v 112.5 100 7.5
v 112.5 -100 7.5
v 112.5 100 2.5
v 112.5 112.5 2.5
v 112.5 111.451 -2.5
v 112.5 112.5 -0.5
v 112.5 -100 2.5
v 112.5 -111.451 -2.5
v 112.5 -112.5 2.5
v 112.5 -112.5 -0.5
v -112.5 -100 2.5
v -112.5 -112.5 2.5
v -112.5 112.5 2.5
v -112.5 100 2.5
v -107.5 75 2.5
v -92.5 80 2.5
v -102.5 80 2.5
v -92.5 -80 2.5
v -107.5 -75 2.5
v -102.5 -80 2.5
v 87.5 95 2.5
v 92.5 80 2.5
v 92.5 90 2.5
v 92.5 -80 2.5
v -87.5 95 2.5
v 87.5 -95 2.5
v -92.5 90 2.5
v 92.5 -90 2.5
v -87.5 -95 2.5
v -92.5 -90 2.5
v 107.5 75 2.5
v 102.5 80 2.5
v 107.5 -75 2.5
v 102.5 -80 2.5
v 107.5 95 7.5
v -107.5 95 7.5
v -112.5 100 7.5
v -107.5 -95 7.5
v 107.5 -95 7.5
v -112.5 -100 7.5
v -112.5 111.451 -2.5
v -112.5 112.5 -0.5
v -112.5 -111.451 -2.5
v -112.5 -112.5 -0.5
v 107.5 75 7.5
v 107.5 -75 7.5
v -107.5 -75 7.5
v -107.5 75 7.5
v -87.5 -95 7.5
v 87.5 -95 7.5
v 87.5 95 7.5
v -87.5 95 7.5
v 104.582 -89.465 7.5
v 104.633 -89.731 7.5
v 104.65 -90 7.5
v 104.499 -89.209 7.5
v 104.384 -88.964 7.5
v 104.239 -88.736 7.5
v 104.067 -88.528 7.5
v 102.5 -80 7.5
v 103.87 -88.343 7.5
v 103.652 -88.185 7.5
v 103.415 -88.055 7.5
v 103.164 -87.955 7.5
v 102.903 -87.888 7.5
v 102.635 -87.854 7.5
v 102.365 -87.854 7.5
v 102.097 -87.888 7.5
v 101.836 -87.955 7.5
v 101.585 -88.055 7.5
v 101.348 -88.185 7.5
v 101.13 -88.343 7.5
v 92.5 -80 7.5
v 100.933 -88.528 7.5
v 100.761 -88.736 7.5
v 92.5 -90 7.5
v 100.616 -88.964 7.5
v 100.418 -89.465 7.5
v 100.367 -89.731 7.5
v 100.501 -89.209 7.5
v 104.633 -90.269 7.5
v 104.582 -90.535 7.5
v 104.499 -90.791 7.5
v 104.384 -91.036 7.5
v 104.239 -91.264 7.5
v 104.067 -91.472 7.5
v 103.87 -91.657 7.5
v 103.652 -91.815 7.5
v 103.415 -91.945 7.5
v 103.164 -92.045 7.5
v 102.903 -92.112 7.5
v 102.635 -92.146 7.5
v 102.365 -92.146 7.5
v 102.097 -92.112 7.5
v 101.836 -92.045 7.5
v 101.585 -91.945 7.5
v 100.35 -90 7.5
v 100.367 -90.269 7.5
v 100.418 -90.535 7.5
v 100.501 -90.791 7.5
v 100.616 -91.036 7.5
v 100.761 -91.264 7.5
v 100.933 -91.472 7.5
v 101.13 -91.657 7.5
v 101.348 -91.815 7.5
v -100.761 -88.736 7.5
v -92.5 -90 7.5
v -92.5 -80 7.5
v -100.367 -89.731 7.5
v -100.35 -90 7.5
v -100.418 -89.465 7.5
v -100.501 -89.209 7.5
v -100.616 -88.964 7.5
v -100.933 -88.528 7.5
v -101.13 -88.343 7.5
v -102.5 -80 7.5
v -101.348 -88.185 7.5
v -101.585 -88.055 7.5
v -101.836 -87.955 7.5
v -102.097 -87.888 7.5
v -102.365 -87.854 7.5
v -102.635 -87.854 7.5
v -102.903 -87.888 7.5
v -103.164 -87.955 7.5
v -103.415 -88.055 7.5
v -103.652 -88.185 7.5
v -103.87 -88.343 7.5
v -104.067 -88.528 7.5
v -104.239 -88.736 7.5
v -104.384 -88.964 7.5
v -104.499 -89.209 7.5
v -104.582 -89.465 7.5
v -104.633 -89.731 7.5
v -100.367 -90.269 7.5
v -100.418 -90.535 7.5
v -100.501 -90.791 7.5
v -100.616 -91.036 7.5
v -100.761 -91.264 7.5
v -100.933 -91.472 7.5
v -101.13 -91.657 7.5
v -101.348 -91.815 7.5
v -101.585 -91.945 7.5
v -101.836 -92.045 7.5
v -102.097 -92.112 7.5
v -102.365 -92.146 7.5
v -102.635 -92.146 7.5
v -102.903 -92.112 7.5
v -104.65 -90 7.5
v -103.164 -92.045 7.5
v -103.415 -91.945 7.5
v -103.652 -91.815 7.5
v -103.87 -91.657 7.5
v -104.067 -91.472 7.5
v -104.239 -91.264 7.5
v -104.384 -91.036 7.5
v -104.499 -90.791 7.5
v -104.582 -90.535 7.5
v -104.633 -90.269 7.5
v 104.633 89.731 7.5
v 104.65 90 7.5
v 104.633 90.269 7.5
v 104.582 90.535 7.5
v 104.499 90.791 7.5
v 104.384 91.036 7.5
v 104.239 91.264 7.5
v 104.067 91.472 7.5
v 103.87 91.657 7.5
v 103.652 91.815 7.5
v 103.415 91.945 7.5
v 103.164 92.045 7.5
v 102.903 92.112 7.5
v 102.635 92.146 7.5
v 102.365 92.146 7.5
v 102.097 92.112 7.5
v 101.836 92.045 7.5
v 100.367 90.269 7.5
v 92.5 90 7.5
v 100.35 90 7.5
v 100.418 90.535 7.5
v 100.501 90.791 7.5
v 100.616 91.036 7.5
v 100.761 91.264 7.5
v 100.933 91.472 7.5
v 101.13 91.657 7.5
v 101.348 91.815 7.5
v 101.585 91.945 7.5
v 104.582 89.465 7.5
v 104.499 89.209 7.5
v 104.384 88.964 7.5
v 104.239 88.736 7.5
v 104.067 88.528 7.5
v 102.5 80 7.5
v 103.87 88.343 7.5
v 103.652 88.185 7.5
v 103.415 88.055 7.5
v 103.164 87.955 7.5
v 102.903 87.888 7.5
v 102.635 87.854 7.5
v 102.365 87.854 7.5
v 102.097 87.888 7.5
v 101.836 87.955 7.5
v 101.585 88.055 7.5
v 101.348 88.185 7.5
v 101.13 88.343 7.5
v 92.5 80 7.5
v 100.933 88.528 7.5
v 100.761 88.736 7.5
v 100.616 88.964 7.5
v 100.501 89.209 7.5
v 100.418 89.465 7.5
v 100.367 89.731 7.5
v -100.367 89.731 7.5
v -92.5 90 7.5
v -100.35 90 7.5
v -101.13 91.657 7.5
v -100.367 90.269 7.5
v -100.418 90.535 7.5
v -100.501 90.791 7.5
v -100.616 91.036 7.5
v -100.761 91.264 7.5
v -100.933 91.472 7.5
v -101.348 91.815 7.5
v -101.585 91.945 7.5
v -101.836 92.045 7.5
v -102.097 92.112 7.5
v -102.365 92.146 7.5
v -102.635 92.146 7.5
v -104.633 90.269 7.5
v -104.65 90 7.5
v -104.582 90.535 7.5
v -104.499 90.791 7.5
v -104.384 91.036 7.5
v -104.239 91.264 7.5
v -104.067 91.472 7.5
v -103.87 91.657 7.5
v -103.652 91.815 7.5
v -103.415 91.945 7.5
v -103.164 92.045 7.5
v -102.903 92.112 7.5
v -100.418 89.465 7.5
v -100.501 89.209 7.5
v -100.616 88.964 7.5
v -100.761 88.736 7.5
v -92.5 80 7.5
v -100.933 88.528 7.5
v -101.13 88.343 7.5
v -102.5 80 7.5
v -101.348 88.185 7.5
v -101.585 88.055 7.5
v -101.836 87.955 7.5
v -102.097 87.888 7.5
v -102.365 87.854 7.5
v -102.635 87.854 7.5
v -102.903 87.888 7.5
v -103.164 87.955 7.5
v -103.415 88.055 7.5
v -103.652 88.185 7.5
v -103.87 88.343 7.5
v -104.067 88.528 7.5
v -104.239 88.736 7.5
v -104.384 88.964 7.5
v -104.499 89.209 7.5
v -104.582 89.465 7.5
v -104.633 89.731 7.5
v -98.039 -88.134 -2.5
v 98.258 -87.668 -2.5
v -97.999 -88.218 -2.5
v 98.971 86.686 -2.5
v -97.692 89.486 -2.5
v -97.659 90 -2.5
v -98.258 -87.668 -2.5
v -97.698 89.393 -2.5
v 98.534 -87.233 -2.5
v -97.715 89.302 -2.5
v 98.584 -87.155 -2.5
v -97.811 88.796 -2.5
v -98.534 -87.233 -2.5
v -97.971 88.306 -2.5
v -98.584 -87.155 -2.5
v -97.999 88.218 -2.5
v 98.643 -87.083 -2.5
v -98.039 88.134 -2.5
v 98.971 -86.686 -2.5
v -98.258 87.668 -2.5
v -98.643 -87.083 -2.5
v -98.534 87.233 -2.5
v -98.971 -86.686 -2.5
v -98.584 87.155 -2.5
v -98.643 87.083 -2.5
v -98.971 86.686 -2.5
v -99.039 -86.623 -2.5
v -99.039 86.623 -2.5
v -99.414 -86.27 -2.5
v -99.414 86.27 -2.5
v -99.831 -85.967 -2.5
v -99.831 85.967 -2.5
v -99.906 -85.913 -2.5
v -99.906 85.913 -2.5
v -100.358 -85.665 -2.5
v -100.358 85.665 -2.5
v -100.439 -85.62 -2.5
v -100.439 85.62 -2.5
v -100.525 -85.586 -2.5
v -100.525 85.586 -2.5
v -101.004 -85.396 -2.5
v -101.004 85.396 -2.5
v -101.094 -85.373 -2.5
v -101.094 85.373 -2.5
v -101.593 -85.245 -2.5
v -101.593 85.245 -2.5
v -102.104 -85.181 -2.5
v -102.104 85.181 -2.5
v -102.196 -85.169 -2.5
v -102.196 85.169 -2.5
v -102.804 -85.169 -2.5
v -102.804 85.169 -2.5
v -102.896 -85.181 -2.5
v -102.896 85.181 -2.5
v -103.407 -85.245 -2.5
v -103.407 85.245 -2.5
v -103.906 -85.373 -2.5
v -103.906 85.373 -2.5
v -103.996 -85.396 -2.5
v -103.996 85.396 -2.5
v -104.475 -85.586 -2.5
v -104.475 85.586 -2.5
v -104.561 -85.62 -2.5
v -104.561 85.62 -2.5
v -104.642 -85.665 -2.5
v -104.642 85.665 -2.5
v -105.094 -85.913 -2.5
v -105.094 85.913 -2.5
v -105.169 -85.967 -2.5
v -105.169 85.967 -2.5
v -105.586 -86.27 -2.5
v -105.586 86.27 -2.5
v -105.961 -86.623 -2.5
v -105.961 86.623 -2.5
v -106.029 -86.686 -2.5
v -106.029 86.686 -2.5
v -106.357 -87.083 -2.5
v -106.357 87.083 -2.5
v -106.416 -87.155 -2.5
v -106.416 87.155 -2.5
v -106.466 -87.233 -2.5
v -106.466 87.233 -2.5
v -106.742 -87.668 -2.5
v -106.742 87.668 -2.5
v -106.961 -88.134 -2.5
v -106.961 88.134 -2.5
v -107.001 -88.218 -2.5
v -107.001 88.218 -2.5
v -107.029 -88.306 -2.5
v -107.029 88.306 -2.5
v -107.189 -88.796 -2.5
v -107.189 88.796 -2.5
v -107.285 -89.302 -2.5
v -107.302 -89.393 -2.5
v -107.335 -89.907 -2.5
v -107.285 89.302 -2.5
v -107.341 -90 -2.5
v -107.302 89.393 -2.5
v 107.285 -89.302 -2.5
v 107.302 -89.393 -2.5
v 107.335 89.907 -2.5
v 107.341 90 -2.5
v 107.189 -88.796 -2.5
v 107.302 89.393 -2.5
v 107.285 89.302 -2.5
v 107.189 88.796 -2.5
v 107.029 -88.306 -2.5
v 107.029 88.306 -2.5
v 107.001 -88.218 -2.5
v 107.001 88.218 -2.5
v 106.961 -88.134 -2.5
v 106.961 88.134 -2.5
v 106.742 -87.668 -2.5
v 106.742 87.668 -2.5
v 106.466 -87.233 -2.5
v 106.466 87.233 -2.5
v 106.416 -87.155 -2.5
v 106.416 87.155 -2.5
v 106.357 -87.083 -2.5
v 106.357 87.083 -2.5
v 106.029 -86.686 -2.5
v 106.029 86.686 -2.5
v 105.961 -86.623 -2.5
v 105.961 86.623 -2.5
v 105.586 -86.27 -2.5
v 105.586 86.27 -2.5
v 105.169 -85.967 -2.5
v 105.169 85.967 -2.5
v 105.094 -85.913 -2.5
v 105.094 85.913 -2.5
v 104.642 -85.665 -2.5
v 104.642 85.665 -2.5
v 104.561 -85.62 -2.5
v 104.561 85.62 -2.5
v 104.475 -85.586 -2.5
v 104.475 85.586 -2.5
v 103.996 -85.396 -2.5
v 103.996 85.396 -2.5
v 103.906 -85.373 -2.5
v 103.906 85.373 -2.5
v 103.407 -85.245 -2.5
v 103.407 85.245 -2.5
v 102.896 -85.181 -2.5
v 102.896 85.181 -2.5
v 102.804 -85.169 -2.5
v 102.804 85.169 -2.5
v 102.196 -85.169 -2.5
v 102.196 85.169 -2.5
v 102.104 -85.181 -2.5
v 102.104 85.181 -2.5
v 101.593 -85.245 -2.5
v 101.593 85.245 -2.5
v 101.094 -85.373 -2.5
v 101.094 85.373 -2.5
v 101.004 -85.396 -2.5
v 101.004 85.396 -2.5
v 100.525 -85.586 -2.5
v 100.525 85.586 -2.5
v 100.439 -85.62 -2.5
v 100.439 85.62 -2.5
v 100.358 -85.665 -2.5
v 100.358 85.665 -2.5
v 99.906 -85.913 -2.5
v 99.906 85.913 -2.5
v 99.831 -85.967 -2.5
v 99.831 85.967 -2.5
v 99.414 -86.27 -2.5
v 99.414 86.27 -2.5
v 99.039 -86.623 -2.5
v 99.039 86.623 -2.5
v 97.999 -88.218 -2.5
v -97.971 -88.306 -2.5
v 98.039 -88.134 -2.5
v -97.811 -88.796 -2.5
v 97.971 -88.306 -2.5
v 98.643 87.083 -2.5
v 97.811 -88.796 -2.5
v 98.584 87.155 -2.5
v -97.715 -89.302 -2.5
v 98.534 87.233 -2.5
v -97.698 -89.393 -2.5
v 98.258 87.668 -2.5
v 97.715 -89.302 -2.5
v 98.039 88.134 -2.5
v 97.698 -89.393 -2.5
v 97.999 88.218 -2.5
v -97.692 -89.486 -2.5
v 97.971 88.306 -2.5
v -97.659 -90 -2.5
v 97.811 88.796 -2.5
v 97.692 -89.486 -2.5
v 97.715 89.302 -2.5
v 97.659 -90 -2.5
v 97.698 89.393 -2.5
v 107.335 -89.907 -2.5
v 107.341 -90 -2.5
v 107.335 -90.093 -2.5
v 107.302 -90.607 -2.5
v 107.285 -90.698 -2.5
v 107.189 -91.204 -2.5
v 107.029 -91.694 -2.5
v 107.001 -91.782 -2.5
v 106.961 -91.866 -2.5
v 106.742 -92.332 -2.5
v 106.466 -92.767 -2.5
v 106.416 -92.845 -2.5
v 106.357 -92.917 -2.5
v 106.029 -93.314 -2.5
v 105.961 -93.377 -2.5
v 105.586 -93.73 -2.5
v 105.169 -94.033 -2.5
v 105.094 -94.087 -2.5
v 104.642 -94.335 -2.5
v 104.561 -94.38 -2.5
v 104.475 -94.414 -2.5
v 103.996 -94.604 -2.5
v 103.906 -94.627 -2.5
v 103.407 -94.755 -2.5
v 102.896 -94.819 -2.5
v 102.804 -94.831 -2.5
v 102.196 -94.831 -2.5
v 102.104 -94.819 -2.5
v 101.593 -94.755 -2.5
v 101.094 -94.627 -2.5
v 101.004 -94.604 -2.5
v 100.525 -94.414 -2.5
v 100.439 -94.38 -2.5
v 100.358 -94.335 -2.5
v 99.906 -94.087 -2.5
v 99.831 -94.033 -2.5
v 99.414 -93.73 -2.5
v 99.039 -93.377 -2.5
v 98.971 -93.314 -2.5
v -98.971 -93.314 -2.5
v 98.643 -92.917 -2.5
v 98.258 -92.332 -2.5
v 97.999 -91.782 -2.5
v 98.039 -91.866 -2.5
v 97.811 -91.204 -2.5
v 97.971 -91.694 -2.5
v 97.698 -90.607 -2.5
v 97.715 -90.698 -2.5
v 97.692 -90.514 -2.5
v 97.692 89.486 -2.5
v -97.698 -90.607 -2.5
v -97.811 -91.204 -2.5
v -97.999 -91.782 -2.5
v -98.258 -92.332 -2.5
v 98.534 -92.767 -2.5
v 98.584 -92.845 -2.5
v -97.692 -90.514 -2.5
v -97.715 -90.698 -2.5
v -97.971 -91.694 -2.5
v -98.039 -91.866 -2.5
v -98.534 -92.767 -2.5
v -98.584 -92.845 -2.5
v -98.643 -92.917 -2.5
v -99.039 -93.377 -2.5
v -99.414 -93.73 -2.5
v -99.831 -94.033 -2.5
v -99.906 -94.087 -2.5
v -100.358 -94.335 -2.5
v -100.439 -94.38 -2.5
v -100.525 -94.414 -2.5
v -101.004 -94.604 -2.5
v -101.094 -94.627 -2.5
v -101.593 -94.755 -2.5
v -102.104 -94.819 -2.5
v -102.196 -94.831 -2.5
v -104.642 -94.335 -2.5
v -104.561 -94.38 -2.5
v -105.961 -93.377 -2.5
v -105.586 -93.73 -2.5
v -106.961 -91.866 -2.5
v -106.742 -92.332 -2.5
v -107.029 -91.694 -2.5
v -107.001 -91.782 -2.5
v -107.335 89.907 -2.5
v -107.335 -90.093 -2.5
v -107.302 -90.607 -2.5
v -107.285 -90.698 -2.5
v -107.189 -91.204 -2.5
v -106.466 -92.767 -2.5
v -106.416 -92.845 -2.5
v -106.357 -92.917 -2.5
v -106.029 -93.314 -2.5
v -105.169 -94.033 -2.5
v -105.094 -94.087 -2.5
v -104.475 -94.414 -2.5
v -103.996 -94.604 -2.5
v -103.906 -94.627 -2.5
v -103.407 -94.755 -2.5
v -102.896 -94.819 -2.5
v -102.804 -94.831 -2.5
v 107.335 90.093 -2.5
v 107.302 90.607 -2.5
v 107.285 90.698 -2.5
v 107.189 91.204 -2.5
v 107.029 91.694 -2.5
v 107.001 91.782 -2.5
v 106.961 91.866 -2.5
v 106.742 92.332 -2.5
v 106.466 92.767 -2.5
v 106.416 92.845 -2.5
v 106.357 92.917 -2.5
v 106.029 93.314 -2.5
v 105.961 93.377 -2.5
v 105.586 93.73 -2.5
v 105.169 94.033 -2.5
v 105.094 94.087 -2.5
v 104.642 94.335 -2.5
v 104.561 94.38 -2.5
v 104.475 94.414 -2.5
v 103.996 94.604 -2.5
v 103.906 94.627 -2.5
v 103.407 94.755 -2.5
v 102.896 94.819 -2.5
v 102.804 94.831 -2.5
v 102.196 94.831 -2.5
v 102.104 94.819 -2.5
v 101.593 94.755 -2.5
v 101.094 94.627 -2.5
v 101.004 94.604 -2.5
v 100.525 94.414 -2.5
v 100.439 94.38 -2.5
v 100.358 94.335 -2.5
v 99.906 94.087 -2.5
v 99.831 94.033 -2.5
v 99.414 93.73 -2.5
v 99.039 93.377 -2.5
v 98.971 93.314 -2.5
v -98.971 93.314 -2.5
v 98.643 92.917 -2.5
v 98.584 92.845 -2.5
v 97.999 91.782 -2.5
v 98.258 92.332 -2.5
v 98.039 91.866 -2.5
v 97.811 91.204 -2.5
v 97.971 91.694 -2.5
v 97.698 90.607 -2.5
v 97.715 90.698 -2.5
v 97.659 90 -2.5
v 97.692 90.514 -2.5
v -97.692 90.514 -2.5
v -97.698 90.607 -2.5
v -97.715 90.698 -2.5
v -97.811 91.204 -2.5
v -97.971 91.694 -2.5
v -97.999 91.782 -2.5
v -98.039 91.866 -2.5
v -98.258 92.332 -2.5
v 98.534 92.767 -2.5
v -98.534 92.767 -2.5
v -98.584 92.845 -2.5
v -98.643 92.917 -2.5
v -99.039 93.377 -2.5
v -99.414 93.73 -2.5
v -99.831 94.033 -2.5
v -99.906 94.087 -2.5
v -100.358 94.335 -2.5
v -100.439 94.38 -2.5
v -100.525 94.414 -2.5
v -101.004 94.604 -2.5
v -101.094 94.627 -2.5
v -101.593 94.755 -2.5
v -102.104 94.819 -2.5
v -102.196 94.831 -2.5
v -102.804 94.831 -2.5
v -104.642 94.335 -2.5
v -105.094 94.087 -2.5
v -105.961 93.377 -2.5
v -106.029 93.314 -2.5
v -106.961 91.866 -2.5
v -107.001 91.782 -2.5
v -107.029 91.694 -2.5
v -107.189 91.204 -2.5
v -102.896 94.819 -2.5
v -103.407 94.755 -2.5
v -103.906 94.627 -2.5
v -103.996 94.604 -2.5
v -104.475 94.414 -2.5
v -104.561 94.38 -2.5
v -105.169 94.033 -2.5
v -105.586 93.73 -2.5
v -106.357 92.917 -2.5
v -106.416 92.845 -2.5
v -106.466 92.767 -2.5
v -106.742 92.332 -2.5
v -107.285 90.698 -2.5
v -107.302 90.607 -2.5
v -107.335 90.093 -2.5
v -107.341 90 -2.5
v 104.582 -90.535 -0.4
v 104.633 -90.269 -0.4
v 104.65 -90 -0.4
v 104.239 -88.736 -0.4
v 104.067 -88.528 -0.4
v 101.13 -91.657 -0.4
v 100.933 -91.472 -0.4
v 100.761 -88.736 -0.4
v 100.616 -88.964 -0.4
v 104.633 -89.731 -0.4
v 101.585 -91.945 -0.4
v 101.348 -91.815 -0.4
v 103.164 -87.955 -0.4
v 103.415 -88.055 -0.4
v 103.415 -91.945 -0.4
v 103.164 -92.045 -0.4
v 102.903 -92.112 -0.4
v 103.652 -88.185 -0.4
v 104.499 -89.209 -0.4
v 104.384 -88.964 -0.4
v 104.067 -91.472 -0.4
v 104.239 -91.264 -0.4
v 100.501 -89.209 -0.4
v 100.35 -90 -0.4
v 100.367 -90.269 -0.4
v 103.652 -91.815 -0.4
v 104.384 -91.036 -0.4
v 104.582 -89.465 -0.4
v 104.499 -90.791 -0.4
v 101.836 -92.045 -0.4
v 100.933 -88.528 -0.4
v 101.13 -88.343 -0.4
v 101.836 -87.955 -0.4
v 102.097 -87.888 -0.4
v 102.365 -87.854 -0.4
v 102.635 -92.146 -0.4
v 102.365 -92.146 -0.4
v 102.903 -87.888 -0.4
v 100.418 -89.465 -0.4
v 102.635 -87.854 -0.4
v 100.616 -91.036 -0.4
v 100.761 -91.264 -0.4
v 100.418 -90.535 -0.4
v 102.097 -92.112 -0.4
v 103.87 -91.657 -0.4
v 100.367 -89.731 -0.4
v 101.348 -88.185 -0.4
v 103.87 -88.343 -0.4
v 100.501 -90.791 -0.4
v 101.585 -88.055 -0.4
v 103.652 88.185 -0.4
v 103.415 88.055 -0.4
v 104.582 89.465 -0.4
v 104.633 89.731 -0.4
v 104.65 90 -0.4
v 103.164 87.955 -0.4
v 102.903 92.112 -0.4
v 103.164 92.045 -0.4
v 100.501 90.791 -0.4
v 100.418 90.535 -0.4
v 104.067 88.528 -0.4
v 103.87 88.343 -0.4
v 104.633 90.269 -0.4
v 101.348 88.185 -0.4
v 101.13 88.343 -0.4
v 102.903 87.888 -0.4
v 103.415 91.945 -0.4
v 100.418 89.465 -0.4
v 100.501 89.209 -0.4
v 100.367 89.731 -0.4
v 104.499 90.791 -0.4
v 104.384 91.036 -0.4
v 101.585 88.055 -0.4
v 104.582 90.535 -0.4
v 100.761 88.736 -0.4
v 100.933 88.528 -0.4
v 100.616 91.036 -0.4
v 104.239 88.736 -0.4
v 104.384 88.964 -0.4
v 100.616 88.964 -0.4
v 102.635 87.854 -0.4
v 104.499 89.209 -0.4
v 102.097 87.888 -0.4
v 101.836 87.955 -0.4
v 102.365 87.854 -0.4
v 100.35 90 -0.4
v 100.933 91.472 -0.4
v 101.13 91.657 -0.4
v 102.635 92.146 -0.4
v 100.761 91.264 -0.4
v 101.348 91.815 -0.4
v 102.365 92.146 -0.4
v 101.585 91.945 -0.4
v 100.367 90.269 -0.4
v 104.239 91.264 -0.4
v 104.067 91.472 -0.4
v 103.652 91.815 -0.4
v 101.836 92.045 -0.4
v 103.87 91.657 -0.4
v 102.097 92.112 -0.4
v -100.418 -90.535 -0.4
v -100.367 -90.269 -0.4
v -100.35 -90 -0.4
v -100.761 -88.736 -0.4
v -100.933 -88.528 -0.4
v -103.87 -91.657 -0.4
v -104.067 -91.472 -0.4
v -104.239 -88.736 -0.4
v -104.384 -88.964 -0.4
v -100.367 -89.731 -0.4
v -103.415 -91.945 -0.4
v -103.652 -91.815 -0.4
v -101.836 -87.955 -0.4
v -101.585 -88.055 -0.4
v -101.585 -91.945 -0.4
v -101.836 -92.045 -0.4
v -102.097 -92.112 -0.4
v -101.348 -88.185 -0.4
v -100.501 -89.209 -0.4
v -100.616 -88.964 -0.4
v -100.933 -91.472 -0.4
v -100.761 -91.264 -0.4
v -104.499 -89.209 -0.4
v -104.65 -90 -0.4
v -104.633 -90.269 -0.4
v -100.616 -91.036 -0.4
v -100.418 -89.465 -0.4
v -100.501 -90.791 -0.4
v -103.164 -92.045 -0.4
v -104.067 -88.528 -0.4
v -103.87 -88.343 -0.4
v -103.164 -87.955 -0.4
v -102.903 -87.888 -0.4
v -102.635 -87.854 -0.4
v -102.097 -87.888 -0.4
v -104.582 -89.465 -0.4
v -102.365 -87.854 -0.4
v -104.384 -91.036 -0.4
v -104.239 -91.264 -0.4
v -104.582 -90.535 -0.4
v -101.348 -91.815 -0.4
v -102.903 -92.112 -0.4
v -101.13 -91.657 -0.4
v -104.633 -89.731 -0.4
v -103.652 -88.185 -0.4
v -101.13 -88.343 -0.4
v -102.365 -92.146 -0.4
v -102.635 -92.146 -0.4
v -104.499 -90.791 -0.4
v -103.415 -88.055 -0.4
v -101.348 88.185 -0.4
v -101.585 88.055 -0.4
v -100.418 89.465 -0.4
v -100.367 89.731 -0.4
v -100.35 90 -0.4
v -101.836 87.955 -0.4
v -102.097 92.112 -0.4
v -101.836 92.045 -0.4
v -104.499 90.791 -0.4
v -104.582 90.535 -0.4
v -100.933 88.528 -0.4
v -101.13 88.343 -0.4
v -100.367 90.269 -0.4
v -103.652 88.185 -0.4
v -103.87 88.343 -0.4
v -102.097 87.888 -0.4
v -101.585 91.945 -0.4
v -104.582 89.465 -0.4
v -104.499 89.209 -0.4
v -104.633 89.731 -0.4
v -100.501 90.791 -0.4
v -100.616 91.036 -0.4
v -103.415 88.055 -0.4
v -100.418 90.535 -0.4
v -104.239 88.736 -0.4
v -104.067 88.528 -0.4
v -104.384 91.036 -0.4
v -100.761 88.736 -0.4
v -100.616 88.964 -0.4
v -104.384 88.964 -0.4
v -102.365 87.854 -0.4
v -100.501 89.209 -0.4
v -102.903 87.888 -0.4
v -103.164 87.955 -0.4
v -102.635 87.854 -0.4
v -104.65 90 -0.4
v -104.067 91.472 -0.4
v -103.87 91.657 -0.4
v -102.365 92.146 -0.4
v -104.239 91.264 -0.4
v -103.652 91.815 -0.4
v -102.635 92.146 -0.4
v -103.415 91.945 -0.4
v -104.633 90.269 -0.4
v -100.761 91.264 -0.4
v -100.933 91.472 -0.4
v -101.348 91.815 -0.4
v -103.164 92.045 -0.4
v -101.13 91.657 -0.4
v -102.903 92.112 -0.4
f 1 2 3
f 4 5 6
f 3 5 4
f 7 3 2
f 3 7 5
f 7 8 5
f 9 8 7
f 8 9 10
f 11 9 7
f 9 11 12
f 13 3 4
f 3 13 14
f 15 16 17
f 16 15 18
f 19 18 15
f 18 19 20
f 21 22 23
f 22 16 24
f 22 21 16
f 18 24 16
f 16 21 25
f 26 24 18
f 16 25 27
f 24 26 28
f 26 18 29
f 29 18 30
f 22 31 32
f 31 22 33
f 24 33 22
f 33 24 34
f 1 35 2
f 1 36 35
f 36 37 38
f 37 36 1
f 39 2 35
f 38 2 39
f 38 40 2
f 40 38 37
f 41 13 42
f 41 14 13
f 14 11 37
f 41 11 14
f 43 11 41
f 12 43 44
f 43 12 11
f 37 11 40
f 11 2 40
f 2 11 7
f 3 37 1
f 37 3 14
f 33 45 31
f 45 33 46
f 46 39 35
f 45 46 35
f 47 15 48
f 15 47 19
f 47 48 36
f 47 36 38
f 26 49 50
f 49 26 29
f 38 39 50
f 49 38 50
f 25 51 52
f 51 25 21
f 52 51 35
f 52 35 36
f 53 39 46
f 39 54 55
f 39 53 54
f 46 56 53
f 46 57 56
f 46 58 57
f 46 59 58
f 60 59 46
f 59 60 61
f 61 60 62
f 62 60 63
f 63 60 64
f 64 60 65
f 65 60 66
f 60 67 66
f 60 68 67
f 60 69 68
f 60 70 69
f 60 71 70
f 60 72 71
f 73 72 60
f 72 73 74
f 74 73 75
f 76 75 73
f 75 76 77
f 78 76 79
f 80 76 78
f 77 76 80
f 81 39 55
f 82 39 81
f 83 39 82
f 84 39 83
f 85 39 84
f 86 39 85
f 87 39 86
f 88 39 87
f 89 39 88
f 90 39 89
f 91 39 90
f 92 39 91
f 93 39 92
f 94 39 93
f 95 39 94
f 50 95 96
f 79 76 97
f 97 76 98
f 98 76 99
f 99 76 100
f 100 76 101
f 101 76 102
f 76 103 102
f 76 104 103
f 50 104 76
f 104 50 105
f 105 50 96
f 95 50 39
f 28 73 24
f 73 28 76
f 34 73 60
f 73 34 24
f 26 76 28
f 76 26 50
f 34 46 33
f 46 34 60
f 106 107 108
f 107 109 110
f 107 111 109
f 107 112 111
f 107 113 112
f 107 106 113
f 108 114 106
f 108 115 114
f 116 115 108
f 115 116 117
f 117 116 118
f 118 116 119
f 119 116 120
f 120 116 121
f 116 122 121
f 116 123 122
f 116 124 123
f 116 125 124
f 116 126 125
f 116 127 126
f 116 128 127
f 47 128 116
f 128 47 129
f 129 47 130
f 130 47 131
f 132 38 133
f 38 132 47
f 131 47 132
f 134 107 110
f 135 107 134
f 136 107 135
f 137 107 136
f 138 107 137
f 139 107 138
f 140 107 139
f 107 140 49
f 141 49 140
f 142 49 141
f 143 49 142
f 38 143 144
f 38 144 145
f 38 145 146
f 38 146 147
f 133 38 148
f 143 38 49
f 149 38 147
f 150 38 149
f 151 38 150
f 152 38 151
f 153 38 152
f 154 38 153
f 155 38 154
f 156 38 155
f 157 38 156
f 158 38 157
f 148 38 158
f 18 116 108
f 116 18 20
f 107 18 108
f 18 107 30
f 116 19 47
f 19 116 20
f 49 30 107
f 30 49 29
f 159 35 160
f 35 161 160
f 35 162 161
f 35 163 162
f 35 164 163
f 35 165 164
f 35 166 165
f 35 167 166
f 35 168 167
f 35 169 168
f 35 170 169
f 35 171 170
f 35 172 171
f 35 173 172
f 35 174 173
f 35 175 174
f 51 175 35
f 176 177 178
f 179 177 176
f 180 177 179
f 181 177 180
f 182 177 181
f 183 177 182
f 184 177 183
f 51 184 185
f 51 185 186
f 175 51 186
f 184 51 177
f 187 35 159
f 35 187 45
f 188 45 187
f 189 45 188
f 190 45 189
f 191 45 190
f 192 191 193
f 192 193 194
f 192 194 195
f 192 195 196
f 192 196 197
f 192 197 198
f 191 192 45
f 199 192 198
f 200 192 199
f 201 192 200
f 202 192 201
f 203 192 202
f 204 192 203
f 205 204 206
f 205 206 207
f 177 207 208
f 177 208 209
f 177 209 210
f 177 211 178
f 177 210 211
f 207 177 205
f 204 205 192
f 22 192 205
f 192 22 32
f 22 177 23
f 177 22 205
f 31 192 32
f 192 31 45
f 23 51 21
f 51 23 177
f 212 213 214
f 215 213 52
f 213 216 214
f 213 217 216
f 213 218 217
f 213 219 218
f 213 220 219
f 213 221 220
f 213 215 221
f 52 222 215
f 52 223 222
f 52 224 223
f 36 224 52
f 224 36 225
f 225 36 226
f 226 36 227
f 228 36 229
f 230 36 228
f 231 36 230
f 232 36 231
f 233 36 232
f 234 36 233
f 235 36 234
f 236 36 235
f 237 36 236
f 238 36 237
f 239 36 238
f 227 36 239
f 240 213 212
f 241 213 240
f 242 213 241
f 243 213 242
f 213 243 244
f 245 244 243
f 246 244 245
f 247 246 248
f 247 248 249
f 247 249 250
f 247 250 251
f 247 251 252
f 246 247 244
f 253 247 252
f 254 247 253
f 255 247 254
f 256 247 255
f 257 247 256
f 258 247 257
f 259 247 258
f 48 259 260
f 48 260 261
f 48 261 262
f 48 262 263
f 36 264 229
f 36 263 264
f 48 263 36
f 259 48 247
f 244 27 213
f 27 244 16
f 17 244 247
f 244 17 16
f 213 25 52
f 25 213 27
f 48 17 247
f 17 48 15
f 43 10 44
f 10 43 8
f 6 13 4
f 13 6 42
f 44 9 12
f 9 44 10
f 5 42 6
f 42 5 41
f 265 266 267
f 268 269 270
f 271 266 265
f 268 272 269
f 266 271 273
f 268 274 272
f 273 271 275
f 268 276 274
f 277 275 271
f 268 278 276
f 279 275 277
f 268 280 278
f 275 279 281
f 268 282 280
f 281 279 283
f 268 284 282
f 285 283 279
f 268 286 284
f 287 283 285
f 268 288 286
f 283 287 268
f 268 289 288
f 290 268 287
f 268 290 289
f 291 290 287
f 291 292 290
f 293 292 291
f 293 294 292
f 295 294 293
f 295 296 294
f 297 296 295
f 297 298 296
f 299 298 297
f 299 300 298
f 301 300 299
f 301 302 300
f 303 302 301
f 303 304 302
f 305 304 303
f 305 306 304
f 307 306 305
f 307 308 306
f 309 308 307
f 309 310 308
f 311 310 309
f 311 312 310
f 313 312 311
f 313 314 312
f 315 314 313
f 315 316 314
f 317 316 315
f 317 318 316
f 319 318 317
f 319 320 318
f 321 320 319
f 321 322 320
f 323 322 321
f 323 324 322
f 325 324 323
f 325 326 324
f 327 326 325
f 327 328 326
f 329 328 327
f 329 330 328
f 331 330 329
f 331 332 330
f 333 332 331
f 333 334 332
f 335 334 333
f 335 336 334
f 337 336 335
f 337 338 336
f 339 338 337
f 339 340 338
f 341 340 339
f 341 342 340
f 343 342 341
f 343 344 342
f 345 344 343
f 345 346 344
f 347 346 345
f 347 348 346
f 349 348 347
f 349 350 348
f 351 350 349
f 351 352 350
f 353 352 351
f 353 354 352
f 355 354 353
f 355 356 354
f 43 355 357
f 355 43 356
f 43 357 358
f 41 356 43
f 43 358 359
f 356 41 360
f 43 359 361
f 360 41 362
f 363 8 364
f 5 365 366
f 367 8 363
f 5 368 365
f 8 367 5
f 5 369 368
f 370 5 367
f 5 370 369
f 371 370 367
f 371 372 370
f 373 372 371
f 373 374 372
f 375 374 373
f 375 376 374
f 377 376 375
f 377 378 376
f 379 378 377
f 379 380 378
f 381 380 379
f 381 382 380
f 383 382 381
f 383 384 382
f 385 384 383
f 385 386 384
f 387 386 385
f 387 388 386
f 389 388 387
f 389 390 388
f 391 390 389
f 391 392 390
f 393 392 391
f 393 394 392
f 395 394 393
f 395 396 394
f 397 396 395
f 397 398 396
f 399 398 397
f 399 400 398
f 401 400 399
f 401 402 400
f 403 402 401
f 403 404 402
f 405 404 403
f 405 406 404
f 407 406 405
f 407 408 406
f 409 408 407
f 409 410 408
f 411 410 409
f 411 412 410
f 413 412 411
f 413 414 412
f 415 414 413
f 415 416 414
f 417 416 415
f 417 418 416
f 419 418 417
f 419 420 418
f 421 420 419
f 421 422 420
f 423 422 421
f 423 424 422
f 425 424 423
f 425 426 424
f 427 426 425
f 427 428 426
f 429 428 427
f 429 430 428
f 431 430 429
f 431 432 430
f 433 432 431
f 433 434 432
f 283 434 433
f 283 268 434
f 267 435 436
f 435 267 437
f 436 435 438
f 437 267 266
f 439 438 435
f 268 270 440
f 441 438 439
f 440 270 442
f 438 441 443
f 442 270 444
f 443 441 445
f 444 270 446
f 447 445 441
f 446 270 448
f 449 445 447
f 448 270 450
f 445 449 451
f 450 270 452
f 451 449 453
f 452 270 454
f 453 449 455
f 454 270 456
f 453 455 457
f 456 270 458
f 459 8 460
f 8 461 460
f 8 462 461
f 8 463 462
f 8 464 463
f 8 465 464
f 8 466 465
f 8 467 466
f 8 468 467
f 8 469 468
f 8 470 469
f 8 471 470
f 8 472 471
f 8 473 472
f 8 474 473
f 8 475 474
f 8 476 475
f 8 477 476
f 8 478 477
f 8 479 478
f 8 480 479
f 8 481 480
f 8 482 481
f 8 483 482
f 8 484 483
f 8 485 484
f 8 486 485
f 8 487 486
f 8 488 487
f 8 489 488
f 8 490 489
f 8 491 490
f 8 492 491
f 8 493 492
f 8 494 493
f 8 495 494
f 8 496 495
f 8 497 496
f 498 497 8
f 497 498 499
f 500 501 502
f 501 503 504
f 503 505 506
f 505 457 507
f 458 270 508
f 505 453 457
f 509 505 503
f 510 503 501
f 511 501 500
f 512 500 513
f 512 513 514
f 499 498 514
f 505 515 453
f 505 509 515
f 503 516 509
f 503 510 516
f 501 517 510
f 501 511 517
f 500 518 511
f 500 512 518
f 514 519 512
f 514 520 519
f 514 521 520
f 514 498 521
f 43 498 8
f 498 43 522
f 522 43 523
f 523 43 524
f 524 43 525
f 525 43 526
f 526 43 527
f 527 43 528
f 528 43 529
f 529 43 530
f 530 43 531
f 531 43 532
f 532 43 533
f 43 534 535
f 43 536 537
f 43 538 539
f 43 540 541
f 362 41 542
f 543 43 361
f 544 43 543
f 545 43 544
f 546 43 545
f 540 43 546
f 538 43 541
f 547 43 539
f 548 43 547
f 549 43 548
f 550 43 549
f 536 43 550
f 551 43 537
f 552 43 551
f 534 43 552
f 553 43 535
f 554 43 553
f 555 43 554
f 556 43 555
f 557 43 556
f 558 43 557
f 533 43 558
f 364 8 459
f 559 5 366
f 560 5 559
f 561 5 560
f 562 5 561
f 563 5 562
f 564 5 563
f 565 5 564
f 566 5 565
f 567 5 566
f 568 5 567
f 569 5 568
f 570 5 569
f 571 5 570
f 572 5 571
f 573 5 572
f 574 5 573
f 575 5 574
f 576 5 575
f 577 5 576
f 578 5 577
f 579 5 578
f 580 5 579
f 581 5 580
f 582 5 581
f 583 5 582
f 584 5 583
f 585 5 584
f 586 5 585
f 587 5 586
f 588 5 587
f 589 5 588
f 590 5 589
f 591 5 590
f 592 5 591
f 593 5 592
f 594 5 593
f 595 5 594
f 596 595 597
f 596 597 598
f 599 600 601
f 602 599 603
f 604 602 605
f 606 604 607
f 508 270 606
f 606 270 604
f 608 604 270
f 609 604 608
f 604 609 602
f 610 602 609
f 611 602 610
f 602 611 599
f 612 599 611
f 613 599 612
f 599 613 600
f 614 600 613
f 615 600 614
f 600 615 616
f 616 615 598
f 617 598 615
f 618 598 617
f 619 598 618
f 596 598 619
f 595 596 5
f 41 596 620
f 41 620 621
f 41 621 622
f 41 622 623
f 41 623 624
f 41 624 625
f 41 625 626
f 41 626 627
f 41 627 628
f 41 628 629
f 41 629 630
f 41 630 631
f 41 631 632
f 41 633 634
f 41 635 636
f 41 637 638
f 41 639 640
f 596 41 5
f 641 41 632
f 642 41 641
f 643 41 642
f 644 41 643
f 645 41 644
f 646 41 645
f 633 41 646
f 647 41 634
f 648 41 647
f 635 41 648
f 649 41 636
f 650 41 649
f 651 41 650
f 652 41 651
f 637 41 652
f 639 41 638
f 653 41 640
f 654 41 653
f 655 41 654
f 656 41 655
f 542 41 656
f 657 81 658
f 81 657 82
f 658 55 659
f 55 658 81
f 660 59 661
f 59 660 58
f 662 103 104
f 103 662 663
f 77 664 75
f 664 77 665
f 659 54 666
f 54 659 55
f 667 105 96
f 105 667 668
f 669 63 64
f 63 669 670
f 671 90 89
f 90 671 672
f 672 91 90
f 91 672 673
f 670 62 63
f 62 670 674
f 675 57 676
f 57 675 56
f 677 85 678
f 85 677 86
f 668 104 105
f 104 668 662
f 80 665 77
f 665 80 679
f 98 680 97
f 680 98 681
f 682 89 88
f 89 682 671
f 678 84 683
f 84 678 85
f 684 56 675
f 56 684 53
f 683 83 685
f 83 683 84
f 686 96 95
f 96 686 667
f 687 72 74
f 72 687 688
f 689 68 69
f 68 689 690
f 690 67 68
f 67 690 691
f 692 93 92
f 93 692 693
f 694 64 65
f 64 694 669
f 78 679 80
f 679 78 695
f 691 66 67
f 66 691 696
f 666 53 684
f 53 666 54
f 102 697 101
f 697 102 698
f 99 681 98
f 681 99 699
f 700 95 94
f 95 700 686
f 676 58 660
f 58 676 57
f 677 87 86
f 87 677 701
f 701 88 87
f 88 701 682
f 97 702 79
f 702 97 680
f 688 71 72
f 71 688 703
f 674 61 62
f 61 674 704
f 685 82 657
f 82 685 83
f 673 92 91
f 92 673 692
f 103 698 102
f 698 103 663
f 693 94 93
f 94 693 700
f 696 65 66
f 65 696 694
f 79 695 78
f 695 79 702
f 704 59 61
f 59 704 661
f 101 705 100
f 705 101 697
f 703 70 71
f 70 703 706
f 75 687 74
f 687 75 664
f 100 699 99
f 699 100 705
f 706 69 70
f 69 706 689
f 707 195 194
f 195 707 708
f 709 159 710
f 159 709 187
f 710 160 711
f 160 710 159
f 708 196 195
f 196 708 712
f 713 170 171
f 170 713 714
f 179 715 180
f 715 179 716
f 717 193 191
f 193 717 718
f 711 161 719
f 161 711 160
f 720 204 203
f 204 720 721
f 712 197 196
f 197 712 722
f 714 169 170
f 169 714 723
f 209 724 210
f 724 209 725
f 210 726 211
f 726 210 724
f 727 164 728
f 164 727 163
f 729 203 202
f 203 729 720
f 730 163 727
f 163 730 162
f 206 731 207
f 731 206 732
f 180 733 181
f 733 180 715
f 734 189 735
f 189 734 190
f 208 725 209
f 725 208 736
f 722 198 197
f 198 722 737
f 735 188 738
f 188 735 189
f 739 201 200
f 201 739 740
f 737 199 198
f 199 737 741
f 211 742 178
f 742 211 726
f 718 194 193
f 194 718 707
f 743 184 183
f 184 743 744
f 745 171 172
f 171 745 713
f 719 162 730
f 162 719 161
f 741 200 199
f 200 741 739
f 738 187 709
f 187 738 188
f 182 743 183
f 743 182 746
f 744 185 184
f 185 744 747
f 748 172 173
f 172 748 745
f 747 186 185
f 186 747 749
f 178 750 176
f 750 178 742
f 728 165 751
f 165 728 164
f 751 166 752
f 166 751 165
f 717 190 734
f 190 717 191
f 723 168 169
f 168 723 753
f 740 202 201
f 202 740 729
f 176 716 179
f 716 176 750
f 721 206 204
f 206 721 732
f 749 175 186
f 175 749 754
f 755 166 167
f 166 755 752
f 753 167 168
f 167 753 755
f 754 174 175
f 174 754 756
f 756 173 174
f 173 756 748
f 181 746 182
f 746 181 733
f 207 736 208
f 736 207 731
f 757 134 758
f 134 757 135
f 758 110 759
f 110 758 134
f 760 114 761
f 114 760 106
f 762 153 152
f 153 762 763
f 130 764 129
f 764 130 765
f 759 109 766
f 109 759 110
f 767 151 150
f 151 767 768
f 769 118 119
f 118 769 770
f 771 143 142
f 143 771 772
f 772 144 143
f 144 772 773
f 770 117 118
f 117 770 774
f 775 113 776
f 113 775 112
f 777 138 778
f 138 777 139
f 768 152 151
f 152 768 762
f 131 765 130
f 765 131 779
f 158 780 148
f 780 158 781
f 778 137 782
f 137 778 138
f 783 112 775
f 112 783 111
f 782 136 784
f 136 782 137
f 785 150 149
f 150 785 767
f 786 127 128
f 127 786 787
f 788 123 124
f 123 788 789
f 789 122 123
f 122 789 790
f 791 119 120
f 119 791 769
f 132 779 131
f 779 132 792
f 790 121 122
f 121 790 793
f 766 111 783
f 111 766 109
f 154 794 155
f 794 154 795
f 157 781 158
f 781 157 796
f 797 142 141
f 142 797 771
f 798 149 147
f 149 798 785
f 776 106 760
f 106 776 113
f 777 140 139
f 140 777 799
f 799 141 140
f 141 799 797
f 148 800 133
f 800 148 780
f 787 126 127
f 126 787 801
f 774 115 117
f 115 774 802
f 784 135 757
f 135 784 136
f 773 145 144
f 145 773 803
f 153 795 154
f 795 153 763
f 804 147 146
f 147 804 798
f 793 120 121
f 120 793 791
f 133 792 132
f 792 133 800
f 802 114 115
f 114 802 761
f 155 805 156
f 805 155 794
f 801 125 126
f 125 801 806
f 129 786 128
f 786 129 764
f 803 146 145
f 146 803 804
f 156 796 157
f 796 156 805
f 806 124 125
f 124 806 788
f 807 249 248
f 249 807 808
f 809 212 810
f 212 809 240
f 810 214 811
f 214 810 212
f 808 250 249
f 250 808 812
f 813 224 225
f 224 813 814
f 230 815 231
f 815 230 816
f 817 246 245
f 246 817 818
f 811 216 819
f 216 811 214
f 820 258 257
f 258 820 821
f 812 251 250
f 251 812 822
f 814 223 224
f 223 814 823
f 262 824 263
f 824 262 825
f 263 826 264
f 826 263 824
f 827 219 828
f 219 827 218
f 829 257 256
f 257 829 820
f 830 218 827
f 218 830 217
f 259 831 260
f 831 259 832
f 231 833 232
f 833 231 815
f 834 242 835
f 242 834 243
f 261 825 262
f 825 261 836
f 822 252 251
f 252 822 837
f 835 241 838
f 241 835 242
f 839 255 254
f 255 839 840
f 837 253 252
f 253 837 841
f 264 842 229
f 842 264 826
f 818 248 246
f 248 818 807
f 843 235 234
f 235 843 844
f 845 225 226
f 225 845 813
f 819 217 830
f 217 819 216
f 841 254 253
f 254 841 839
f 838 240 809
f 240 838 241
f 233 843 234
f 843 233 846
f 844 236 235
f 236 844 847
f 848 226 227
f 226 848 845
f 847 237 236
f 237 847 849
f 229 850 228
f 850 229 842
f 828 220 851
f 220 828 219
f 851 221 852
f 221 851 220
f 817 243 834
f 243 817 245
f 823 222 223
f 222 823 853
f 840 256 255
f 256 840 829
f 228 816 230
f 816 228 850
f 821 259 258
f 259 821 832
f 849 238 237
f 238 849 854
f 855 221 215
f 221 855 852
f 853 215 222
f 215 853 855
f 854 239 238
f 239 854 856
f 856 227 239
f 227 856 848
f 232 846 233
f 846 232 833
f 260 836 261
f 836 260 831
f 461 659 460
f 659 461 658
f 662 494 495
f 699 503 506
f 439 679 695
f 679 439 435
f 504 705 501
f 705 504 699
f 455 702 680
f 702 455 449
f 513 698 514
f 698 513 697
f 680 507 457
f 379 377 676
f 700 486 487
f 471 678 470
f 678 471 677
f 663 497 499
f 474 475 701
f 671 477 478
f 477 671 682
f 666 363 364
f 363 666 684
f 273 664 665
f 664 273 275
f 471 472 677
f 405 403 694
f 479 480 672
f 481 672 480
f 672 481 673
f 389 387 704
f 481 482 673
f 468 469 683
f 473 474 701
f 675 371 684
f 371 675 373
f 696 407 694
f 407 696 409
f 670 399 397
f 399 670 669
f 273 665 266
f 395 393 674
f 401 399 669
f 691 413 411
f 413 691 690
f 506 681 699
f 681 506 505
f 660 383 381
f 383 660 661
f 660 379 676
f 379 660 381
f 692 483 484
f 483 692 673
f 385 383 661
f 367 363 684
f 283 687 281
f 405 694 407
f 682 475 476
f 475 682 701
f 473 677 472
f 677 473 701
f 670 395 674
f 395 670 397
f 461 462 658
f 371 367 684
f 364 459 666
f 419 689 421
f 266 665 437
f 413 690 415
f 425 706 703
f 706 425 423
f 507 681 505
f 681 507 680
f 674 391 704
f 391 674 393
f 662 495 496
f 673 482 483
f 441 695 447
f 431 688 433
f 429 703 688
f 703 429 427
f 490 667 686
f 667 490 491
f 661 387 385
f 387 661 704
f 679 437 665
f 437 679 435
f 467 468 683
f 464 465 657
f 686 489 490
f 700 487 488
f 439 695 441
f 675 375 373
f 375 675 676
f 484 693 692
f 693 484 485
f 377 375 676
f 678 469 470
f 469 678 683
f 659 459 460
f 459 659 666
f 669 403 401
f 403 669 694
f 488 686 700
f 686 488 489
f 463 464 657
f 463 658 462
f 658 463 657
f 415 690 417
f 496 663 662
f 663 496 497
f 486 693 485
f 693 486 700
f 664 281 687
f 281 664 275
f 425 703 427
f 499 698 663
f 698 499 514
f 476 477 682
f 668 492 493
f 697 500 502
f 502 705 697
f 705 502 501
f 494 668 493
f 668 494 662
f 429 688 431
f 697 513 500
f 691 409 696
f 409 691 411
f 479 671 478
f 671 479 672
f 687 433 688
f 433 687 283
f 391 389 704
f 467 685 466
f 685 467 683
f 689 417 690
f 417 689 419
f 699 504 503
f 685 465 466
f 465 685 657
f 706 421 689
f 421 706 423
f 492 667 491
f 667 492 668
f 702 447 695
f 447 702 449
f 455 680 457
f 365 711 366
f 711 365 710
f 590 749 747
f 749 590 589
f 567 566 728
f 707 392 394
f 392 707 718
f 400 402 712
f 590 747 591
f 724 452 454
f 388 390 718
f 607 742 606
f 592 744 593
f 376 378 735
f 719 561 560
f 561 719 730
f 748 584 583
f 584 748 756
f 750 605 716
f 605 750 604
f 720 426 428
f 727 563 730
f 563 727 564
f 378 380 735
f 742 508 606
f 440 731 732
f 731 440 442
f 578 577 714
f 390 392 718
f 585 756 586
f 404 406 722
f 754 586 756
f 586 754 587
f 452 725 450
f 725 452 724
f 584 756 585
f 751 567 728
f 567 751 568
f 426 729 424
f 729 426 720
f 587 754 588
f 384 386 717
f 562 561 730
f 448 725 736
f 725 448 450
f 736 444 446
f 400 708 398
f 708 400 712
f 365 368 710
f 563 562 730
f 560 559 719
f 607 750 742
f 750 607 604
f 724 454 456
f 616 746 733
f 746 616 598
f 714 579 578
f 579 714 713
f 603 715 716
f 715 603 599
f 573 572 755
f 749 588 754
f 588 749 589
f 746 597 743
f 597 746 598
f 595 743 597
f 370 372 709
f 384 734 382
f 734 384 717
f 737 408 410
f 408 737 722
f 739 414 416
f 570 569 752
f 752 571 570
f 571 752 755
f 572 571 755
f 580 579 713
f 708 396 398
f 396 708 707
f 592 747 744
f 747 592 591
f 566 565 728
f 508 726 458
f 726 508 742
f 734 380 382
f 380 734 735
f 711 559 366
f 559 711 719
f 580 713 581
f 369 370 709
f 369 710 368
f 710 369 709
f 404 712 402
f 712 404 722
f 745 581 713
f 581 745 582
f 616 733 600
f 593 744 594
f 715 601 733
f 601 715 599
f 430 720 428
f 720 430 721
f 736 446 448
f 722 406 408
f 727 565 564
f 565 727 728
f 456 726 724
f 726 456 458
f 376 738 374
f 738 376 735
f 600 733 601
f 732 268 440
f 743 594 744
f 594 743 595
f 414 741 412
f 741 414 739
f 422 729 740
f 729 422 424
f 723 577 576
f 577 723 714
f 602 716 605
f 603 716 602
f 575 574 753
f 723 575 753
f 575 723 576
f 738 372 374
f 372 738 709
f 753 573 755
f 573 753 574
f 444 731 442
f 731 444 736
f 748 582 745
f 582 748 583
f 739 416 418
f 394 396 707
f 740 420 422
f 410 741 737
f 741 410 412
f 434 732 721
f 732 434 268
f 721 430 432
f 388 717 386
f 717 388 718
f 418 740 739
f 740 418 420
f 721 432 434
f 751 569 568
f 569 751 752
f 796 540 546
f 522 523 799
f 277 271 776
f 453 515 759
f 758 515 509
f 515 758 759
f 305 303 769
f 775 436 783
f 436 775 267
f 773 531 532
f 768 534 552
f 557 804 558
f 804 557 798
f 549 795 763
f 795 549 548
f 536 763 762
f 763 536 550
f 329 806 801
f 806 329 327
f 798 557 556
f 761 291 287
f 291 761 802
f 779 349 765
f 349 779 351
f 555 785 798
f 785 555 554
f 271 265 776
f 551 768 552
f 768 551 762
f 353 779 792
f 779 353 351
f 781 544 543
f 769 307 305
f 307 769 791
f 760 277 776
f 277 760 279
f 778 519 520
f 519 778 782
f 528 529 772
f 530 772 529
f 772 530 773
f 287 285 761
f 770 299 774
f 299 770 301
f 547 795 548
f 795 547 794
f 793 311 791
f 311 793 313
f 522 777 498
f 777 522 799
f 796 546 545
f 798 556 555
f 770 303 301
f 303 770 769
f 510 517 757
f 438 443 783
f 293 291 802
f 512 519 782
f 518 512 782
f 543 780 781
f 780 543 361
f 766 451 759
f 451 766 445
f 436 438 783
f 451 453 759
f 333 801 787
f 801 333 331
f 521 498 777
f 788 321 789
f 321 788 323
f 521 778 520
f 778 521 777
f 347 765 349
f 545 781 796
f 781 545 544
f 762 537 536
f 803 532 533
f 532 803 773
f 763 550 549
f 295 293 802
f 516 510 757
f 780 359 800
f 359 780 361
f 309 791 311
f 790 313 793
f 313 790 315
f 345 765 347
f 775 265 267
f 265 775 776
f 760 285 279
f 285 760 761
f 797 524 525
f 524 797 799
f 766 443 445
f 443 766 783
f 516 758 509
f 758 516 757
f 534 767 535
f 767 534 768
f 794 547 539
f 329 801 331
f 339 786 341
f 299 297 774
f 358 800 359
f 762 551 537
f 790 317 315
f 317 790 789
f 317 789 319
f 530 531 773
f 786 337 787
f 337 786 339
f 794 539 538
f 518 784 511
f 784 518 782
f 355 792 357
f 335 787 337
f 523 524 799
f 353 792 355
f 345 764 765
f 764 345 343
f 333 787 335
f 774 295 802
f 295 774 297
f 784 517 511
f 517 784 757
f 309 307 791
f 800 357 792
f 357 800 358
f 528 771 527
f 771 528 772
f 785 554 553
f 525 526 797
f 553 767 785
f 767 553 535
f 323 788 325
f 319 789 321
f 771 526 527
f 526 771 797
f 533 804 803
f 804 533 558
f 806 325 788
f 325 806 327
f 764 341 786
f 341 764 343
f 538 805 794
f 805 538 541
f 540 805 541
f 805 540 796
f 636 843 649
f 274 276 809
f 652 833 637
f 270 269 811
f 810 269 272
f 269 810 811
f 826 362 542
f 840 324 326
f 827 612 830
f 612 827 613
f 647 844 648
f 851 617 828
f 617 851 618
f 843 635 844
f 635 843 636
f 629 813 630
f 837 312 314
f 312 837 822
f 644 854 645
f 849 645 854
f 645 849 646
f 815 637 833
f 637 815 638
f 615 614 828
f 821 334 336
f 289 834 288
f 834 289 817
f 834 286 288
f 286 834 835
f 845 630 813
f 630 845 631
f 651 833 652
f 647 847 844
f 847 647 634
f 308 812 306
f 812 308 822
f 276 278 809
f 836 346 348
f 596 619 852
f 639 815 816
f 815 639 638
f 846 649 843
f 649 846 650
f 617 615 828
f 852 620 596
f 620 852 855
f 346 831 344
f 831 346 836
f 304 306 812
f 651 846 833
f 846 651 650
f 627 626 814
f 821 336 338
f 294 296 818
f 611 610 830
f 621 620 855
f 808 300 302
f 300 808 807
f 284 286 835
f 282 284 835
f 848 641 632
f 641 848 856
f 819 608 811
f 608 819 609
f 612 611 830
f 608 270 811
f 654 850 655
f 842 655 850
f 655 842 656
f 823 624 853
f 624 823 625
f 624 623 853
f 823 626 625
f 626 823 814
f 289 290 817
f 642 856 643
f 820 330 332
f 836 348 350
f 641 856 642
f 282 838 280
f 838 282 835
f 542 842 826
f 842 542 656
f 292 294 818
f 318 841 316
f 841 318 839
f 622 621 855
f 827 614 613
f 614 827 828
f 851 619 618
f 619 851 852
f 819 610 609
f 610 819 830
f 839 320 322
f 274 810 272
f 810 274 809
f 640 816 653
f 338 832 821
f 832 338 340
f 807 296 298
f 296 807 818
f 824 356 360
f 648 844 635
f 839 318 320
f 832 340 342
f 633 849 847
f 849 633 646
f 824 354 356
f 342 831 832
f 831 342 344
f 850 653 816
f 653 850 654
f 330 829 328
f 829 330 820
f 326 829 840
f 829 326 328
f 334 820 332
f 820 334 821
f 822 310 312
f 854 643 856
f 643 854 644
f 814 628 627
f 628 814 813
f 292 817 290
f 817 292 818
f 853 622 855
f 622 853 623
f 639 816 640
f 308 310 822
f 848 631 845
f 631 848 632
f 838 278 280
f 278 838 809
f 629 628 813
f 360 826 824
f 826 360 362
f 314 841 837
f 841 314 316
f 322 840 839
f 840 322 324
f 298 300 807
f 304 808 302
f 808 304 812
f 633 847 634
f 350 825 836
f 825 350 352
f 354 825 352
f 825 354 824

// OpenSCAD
// file: bottom-panel-overhang-solo.scad
/*
 * SPDX-FileCopyrightText: © 2023 Brian S. Stephan <bss@incorporeal.org>
 * SPDX-License-Identifier: GPL-3.0-or-later
 */

include <parameters.scad>
include <components.scad>

module bottom_panel_solo() {
	difference() {
		rotate([180, 0, 0]) base_panel_with_raised_overhang();
		rotate([180, 0, 0]) panel_holes();
	}
}

bottom_panel_solo();
// file: bottom-panel-overhang-right.scad
/*
 * SPDX-FileCopyrightText: © 2023 Brian S. Stephan <bss@incorporeal.org>
 * SPDX-License-Identifier: GPL-3.0-or-later
 */

include <parameters.scad>
include <components.scad>
use <bottom-panel-overhang-left.scad>

module bottom_panel_right() {
	rotate([0, 0, 180]) bottom_panel_left();
}

bottom_panel_right();
// file: bottom-panel-overhang-left.scad
/*
 * SPDX-FileCopyrightText: © 2023 Brian S. Stephan <bss@incorporeal.org>
 * SPDX-License-Identifier: GPL-3.0-or-later
 */

include <parameters.scad>
include <components.scad>
use <bottom-panel-overhang-solo.scad>

module bottom_panel_left() {
	difference() {
		bottom_panel_solo();
		// chop the right edge off
		side_chopper();
	}
}

bottom_panel_left();
// file: parameters.scad
/*
 * SPDX-FileCopyrightText: © 2023 Brian S. Stephan <bss@incorporeal.org>
 * SPDX-License-Identifier: GPL-3.0-or-later
 */


// CONNECTION POINT SIZES


// adjustments
hole_tolerance = 0.15;

// M2
m2_screw_selftap_radius = 0.95;

// M3
m3_screw_selftap_radius = 1.3;

// M4
m4_bolt_radius = 2 + hole_tolerance;
m4_bolt_countersink_radius = 6.1 + hole_tolerance;
m4_bolt_hex_exterior_radius = 3.6 + hole_tolerance;

// M6
m6_bolt_radius = 3 + hole_tolerance;

// 24mm button
small_button_radius = 12 + hole_tolerance;

// 30mm button
big_button_radius = 15 + hole_tolerance;

// carve out space around buttons for screw-in nuts
// slagcoin has screw-in nut diameter at 36mm for 30mm buttons, 29.5 for 24mm buttons
// radius + value below should leave space for the nut and for fingers to grab the nut
button_radius_connector_space = 5;

// standard lever hole
lever_plate_hole = 12;

// neutrik D screw holes
neutrik_d_screw_radius = 1.6 + hole_tolerance;
neutrik_d_radius = 12 + hole_tolerance;


// ELEMENT DIMENSIONS


// JLF mount dimensions
lever_mount_x = 53;
lever_mount_y = 95;
lever_mount_z = 2;

// base frame box. reminder: inside top and bottom (including mounts) are chopped by panel_z for plates
frame_x = 233;
frame_y = 208;
frame_z = 57;

// depth of the "lip" of the frame that the top plate sets into/supports the overhang
frame_wall = 4;

// top plate, which can either be the whole plate ("inset") or the mounting frame for a plate that overhangs
panel_x = frame_x - (frame_wall * 2);
panel_y = frame_y - (frame_wall * 2);
panel_z = 5;

// some dimensions for frame pieces, useful in doing some intersections and chopping
frame_piece_x_x = frame_x - (frame_wall * 2);	// essentially panel_x, yes
frame_piece_y_y = frame_y;			// the whole y of the frame, yes

// degree to which the extended frame pieces stick out from the end of the frame
frame_extension_x = 25;
frame_extension_y = 25;

// this sinks the bottom and top of the frame inward a bit, and is used to math out two shapes
// when creating the frame box / overhang panel
frame_bevel_height = 1.25;
overhang_panel_bevel_height = 1;

frame_center_to_neutrik = 70;

// width of the column in the frame corners to support the hex bolt
frame_mount_column_width = 20;

// per neutrik (mm)
neutrik_panel_thickness = 3;

// inside the frame
inner_frame_z = frame_z - (panel_z * 2);

// "windowed" pieces chop out the inner wall of the frame as a separate piece in order
// to print it a different color/way/style. to improve friction fit, it is only the below
// value scale of the whole wall, so that the rest of the wall is retained on the outer
// piece, which helps clamp the two together (and helps the panels clamp it all)
inner_frame_z_decorative_scale = 0.95;

// how much the top plate x/y is expanded to overhang the frame
// note that this is relative to the top plate (so the wall is added back)
panel_overhang_amount = 8.5;
overhang_panel_x = panel_x + (frame_wall * 2) + (panel_overhang_amount * 2);
overhang_panel_y = panel_y + (frame_wall * 2) + (panel_overhang_amount * 2);

panel_to_frame_point_offset = 10;
panel_to_frame_point_x = (panel_x/2) - panel_to_frame_point_offset;
panel_to_frame_point_y = (panel_y/2) - panel_to_frame_point_offset;

// frame interior that supports the top plates
panel_support_width = 5;

// additional button radius for decorative panels, etc.
decorative_radius_scale = 1.75;
jumbo_decorative_radius_scale = 2;

// decorative wall cutout parameters
// thicker than the actual base wall to account for the longish pieces
wall_cutout_depth = frame_wall * 3;

// decorative slash parameters
slash_inner_displacement = 10;
slash_width = 15;
slash_height = frame_z-panel_z*3;

// dustwasher parameters
jlf_dustwasher_radius = 19;
jlf_shaft_inner_radius = 4.55;

lsx_nobi_dustwasher_radius = jlf_dustwasher_radius;
lsx_nobi_shaft_inner_radius = 5;

shaft_position_tolerance = 2;

// stand dimensions to display a stick
stand_x = 5;
stand_y = frame_z;
stand_z = 15;

// oled cutout stuff
ssd1306_x = 23;
ssd1306_y = 12;
ssd1306_z = 1;
adafruit_pid_326_oled_ssd1306_cutout_x = 30;
adafruit_pid_326_oled_ssd1306_cutout_y = 32;


// LAYOUTS


sega_2p_column_2_offset = 30.5;
sega_2p_column_3_offset = sega_2p_column_2_offset + 36;
sega_2p_column_4_offset = sega_2p_column_3_offset + 36;
sega_2p_column_5_offset = sega_2p_column_4_offset + 36;

// this offset is from the left edge of the panel
sega_2p_column_1_left_panel_edge_offset = 28.06;

dir_arc_30mm_column_2_offset = 33.8;
dir_arc_30mm_column_3_offset = dir_arc_30mm_column_2_offset + 34.8;
dir_arc_30mm_row_2_offset = 57.2;
dir_arc_30mm_row_3_offset = dir_arc_30mm_row_2_offset + 12.9;
dir_arc_w_30mm_row_4_offset = dir_arc_30mm_row_3_offset + 34.5;
// main file
/*
 * SPDX-FileCopyrightText: © 2023 Brian S. Stephan <bss@incorporeal.org>
 * SPDX-License-Identifier: GPL-3.0-or-later
 */

include <parameters.scad>
include <components.scad>
use <bottom-panel-overhang-left.scad>
use <bottom-panel-overhang-right.scad>

module bottom_panel_middle() {
	intersection() {
		bottom_panel_left();
		bottom_panel_right();
	}
}

bottom_panel_middle();
